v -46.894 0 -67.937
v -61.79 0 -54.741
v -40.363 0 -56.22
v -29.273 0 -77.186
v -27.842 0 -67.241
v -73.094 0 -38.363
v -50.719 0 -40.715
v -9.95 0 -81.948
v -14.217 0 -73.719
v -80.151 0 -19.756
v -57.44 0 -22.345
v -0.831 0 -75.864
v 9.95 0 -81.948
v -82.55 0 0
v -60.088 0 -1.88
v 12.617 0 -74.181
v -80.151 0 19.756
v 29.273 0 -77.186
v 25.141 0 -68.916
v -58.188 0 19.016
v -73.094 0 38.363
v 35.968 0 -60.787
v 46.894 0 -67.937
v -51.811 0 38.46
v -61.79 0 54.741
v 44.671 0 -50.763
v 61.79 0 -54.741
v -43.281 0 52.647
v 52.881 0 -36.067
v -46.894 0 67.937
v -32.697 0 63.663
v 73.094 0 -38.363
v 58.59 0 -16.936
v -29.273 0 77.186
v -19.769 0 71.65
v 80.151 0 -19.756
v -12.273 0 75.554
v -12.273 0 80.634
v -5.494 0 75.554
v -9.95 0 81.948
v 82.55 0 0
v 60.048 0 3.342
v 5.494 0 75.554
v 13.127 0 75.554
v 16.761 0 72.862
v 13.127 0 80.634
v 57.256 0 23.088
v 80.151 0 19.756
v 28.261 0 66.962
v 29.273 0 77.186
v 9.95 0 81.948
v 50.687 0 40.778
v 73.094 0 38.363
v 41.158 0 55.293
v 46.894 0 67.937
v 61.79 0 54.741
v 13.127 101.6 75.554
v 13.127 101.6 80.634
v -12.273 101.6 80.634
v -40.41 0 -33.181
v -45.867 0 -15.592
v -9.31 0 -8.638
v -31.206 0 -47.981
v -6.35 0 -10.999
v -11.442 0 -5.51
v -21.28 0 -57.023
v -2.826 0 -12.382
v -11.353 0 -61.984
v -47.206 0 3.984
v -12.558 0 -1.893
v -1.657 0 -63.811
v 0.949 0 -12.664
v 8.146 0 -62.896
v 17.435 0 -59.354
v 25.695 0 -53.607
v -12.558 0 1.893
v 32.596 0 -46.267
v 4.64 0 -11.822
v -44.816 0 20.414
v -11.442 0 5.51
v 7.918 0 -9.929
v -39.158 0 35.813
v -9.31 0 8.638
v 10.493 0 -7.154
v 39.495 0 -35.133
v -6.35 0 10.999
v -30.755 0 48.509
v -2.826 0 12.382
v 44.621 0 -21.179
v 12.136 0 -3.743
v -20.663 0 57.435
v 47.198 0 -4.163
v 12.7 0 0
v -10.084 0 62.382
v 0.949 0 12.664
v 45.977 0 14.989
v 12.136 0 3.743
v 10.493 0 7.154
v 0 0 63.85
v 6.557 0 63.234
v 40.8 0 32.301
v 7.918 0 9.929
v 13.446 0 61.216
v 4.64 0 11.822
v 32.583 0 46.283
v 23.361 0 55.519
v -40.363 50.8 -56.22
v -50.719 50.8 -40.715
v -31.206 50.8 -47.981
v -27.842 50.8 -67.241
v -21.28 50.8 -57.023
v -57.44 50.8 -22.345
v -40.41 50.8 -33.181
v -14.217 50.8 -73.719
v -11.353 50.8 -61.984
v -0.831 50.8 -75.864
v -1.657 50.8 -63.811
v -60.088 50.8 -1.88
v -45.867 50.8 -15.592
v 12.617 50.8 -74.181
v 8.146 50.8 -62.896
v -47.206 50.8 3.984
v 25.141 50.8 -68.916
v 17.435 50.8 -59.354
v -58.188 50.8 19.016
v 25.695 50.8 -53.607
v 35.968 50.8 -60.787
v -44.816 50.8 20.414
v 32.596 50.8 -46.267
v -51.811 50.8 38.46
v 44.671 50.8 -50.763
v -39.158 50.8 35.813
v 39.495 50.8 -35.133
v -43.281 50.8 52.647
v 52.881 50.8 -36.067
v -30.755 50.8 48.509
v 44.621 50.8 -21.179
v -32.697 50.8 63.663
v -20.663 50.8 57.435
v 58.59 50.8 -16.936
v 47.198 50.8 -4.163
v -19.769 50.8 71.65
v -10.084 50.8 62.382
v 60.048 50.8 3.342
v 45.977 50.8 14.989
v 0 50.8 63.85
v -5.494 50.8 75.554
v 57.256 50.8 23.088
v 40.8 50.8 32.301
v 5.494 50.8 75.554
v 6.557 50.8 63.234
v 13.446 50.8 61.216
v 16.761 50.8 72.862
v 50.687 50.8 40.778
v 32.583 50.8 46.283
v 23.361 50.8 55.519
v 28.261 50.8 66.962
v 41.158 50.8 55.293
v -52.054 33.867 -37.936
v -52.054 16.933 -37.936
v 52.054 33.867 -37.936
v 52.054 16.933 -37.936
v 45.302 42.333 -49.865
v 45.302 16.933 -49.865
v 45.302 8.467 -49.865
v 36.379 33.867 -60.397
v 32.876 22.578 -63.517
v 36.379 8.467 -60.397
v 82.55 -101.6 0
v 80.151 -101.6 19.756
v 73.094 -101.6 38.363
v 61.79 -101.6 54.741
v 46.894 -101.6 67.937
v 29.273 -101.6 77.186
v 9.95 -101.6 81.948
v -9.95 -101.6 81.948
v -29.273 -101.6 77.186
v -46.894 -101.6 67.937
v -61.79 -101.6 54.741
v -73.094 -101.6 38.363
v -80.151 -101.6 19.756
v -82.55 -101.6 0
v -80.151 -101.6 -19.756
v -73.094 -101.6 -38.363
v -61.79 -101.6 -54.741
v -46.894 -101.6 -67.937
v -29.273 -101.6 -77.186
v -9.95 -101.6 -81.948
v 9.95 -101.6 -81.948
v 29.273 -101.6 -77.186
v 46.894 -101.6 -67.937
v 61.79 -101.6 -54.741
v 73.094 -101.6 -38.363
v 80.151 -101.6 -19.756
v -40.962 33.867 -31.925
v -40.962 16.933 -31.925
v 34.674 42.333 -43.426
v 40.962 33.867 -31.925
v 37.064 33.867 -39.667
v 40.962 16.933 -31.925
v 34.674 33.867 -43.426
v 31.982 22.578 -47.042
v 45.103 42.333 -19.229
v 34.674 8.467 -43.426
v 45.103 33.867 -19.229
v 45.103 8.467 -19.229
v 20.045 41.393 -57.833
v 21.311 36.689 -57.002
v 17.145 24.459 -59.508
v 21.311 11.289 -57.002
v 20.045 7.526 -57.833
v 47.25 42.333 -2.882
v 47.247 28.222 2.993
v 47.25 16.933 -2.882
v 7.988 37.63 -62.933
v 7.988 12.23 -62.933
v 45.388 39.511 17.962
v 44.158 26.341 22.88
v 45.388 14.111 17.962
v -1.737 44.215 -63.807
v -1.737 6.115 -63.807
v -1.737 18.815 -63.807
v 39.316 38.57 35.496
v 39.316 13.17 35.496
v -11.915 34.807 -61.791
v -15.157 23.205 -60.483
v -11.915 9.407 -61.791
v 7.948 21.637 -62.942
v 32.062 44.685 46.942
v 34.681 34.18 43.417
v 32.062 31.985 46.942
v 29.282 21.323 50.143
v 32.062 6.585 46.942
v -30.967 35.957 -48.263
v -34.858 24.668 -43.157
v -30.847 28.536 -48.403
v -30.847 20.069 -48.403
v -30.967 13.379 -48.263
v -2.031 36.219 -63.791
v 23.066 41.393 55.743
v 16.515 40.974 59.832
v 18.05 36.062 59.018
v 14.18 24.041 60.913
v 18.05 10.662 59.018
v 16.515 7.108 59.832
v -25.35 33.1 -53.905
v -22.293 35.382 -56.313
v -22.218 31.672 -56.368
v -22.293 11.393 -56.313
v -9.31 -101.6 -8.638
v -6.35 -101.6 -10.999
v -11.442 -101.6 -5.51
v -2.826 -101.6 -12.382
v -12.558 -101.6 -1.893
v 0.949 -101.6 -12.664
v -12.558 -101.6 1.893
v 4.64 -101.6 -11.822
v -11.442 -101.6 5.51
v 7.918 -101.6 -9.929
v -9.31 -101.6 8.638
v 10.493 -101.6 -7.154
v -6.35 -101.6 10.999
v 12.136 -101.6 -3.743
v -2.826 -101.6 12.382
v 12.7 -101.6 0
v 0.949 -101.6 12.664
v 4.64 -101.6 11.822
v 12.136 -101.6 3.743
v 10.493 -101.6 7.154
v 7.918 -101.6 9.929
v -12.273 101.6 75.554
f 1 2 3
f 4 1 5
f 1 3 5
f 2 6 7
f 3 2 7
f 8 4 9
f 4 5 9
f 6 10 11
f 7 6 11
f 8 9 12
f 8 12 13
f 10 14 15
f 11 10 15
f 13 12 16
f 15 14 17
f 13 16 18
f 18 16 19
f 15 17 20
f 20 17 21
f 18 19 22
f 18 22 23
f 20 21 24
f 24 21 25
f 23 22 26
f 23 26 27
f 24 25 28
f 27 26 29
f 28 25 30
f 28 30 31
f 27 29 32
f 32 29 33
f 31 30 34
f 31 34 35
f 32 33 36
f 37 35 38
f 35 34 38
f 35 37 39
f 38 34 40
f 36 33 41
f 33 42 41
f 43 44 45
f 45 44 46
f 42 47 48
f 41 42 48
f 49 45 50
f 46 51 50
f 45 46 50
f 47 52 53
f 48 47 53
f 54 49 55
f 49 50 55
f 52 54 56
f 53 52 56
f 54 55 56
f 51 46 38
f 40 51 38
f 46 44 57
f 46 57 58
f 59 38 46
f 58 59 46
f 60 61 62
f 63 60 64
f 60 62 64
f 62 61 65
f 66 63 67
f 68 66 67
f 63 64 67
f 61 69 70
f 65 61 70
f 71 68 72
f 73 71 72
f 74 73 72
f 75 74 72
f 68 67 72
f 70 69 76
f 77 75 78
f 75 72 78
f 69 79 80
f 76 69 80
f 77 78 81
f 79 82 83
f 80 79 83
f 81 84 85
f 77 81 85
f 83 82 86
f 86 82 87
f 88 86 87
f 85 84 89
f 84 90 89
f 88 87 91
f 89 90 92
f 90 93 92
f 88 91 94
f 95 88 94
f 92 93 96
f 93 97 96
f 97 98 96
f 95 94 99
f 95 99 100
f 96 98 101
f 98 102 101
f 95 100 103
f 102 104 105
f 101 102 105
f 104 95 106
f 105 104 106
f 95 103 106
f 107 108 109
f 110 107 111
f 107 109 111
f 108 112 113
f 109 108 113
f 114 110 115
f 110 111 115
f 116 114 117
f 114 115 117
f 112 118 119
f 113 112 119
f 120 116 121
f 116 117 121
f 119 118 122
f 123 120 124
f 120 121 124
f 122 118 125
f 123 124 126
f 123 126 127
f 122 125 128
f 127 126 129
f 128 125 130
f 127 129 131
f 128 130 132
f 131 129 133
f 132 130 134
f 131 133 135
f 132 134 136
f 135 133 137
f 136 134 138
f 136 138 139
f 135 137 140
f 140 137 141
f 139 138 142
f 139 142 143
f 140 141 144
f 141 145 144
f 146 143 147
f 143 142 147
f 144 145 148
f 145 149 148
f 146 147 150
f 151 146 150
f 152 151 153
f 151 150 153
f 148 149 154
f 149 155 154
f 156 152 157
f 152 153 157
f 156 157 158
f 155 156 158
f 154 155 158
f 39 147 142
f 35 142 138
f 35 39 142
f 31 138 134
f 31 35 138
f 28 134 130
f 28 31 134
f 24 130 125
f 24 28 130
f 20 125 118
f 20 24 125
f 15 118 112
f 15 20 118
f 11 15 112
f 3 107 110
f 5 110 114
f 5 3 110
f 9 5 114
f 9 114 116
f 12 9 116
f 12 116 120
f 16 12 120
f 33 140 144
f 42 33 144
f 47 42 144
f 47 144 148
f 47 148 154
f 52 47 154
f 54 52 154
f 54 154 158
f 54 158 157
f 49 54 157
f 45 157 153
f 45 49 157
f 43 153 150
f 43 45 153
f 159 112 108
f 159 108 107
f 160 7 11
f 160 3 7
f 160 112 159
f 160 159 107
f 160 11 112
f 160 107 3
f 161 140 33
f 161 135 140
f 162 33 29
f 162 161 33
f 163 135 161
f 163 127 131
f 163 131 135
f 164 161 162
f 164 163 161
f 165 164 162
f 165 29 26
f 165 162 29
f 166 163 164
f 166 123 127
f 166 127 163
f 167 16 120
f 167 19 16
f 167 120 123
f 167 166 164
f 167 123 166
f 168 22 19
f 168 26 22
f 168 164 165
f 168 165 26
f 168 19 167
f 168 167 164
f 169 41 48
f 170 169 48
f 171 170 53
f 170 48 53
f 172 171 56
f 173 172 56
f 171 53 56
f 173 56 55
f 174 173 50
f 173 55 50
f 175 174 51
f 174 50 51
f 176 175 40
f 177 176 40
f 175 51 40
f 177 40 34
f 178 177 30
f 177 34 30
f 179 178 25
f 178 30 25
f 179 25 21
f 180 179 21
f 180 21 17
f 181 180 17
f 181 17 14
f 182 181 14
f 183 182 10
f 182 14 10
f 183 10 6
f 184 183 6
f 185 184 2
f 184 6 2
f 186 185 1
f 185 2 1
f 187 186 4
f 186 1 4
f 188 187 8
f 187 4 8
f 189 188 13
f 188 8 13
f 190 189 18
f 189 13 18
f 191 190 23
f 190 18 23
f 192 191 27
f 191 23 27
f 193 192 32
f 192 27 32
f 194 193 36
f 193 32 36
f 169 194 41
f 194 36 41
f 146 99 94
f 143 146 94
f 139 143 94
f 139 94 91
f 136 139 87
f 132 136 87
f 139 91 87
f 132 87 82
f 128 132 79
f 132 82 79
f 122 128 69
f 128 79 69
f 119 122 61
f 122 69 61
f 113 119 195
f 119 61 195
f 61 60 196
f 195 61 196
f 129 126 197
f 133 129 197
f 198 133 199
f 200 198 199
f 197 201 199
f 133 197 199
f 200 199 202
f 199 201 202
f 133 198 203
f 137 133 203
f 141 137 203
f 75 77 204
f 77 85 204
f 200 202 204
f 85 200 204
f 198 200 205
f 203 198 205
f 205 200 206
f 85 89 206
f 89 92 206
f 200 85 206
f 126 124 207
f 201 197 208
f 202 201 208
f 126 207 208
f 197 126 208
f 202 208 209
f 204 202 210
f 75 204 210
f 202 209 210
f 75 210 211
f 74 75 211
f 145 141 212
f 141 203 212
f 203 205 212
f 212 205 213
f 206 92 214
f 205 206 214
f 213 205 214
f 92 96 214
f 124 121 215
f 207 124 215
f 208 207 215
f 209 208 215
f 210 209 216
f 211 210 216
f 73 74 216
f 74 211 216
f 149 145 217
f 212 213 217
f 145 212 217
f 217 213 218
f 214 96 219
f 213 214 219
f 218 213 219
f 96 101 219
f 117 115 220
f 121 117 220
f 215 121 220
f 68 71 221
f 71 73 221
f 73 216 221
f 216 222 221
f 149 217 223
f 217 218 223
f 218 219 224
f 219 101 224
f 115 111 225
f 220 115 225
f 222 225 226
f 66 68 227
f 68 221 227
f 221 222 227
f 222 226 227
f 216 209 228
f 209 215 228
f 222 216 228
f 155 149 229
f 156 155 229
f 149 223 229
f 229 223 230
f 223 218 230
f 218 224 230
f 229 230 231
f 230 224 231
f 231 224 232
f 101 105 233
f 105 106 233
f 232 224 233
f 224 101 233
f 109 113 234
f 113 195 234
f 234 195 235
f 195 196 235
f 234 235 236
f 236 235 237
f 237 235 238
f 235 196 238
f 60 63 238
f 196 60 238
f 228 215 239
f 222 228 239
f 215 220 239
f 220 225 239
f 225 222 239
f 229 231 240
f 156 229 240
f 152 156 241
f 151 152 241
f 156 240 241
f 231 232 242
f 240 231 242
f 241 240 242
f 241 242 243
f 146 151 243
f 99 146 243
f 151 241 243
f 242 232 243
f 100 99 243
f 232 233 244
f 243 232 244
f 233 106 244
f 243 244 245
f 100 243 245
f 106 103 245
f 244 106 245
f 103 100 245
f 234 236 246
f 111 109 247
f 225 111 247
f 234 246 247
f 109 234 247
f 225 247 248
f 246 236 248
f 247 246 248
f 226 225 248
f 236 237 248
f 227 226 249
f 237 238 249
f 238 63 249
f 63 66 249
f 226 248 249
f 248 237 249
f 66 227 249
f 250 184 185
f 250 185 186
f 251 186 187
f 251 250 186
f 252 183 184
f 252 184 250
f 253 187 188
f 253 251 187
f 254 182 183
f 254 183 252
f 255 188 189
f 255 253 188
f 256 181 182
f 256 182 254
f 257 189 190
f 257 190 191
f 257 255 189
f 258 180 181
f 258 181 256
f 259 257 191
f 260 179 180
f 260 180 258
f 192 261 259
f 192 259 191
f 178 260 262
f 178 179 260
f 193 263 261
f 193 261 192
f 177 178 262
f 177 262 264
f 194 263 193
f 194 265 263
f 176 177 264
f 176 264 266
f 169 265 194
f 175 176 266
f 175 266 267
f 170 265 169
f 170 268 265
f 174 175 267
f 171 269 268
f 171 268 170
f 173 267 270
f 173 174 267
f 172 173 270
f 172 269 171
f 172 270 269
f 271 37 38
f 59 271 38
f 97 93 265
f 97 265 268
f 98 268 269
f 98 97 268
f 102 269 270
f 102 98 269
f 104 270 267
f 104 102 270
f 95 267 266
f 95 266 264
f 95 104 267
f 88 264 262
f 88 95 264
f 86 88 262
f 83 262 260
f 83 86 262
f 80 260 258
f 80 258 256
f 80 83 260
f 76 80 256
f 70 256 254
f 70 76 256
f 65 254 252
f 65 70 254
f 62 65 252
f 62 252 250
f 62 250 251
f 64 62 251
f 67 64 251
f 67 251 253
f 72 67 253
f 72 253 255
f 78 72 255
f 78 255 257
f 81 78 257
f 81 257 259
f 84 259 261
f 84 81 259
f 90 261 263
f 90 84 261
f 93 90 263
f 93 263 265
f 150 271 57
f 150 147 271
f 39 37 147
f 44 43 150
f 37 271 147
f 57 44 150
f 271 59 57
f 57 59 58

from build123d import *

# Parameters (mm, degrees)
F0_R      = 82.55
F1_DEPTH  = 101.6
F4_DEPTH  = 25.4
F5_DEPTH  = 50.8
F7_DEPTH  = 50.8
F8_W      = 25.4
F8_H      = 5.08
F9_DEPTH  = 101.6
F10_R     = 12.7
F11_DEPTH = 101.6


with BuildPart() as f1:
    # F0 (on Front) → F1 (new body)
    with BuildSketch(Plane.XZ):
        Circle(F0_R)
    extrude(amount=F1_DEPTH)

    # F3 (on Front) → F4 (cut)
    with BuildSketch(Plane.XZ):
        with BuildLine():
            add(Edge.make_bspline(
                [(0, 63.5), (-79.192427, 63.5), (-39.596214, -31.75), (0, -127), (39.596214, -31.75), (79.192427, 63.5), (0, 63.5)],
                knots=[0, 0, 0, 2.094395, 2.094395, 4.18879, 4.18879, 6.283185, 6.283185, 6.283185], degree=2, weights=[1, 0.5, 1, 0.5, 1, 0.5, 1]))
        make_face()
    extrude(amount=-F4_DEPTH, mode=Mode.SUBTRACT)

    # F2 (on Front) → F5 (join)
    with BuildSketch(Plane.XZ):
        with BuildLine():
            add(Edge.make_bspline(
                [(0, 75.87155), (-104.107058, 75.87155), (-52.053529, -37.935775), (0, -151.743099), (52.053529, -37.935775), (104.107058, 75.87155), (0, 75.87155)],
                knots=[0, 0, 0, 2.094395, 2.094395, 4.18879, 4.18879, 6.283185, 6.283185, 6.283185], degree=2, weights=[1, 0.5, 1, 0.5, 1, 0.5, 1]))
        make_face()
    extrude(amount=-F5_DEPTH)

    # F6 (on Front) → F7 (cut)
    with BuildSketch(Plane.XZ):
        with BuildLine():
            add(Edge.make_bspline(
                [(0, 63.850343), (-81.923546, 63.850343), (-40.961773, -31.925172), (0, -127.700686), (40.961773, -31.925172), (81.923546, 63.850343), (0, 63.850343)],
                knots=[0, 0, 0, 2.094395, 2.094395, 4.18879, 4.18879, 6.283185, 6.283185, 6.283185], degree=2, weights=[1, 0.5, 1, 0.5, 1, 0.5, 1]))
        make_face()
    extrude(amount=-F7_DEPTH, mode=Mode.SUBTRACT)

    # F8 (on Front) → F9 (join)
    with BuildSketch(Plane.XZ):
        with Locations((0.426983, 78.093884)):
            Rectangle(F8_W, F8_H)
    extrude(amount=-F9_DEPTH)

    # F10 (on Front) → F11 (cut)
    with BuildSketch(Plane.XZ):
        Circle(F10_R)
    extrude(amount=F11_DEPTH, mode=Mode.SUBTRACT)


solid = f1.part
